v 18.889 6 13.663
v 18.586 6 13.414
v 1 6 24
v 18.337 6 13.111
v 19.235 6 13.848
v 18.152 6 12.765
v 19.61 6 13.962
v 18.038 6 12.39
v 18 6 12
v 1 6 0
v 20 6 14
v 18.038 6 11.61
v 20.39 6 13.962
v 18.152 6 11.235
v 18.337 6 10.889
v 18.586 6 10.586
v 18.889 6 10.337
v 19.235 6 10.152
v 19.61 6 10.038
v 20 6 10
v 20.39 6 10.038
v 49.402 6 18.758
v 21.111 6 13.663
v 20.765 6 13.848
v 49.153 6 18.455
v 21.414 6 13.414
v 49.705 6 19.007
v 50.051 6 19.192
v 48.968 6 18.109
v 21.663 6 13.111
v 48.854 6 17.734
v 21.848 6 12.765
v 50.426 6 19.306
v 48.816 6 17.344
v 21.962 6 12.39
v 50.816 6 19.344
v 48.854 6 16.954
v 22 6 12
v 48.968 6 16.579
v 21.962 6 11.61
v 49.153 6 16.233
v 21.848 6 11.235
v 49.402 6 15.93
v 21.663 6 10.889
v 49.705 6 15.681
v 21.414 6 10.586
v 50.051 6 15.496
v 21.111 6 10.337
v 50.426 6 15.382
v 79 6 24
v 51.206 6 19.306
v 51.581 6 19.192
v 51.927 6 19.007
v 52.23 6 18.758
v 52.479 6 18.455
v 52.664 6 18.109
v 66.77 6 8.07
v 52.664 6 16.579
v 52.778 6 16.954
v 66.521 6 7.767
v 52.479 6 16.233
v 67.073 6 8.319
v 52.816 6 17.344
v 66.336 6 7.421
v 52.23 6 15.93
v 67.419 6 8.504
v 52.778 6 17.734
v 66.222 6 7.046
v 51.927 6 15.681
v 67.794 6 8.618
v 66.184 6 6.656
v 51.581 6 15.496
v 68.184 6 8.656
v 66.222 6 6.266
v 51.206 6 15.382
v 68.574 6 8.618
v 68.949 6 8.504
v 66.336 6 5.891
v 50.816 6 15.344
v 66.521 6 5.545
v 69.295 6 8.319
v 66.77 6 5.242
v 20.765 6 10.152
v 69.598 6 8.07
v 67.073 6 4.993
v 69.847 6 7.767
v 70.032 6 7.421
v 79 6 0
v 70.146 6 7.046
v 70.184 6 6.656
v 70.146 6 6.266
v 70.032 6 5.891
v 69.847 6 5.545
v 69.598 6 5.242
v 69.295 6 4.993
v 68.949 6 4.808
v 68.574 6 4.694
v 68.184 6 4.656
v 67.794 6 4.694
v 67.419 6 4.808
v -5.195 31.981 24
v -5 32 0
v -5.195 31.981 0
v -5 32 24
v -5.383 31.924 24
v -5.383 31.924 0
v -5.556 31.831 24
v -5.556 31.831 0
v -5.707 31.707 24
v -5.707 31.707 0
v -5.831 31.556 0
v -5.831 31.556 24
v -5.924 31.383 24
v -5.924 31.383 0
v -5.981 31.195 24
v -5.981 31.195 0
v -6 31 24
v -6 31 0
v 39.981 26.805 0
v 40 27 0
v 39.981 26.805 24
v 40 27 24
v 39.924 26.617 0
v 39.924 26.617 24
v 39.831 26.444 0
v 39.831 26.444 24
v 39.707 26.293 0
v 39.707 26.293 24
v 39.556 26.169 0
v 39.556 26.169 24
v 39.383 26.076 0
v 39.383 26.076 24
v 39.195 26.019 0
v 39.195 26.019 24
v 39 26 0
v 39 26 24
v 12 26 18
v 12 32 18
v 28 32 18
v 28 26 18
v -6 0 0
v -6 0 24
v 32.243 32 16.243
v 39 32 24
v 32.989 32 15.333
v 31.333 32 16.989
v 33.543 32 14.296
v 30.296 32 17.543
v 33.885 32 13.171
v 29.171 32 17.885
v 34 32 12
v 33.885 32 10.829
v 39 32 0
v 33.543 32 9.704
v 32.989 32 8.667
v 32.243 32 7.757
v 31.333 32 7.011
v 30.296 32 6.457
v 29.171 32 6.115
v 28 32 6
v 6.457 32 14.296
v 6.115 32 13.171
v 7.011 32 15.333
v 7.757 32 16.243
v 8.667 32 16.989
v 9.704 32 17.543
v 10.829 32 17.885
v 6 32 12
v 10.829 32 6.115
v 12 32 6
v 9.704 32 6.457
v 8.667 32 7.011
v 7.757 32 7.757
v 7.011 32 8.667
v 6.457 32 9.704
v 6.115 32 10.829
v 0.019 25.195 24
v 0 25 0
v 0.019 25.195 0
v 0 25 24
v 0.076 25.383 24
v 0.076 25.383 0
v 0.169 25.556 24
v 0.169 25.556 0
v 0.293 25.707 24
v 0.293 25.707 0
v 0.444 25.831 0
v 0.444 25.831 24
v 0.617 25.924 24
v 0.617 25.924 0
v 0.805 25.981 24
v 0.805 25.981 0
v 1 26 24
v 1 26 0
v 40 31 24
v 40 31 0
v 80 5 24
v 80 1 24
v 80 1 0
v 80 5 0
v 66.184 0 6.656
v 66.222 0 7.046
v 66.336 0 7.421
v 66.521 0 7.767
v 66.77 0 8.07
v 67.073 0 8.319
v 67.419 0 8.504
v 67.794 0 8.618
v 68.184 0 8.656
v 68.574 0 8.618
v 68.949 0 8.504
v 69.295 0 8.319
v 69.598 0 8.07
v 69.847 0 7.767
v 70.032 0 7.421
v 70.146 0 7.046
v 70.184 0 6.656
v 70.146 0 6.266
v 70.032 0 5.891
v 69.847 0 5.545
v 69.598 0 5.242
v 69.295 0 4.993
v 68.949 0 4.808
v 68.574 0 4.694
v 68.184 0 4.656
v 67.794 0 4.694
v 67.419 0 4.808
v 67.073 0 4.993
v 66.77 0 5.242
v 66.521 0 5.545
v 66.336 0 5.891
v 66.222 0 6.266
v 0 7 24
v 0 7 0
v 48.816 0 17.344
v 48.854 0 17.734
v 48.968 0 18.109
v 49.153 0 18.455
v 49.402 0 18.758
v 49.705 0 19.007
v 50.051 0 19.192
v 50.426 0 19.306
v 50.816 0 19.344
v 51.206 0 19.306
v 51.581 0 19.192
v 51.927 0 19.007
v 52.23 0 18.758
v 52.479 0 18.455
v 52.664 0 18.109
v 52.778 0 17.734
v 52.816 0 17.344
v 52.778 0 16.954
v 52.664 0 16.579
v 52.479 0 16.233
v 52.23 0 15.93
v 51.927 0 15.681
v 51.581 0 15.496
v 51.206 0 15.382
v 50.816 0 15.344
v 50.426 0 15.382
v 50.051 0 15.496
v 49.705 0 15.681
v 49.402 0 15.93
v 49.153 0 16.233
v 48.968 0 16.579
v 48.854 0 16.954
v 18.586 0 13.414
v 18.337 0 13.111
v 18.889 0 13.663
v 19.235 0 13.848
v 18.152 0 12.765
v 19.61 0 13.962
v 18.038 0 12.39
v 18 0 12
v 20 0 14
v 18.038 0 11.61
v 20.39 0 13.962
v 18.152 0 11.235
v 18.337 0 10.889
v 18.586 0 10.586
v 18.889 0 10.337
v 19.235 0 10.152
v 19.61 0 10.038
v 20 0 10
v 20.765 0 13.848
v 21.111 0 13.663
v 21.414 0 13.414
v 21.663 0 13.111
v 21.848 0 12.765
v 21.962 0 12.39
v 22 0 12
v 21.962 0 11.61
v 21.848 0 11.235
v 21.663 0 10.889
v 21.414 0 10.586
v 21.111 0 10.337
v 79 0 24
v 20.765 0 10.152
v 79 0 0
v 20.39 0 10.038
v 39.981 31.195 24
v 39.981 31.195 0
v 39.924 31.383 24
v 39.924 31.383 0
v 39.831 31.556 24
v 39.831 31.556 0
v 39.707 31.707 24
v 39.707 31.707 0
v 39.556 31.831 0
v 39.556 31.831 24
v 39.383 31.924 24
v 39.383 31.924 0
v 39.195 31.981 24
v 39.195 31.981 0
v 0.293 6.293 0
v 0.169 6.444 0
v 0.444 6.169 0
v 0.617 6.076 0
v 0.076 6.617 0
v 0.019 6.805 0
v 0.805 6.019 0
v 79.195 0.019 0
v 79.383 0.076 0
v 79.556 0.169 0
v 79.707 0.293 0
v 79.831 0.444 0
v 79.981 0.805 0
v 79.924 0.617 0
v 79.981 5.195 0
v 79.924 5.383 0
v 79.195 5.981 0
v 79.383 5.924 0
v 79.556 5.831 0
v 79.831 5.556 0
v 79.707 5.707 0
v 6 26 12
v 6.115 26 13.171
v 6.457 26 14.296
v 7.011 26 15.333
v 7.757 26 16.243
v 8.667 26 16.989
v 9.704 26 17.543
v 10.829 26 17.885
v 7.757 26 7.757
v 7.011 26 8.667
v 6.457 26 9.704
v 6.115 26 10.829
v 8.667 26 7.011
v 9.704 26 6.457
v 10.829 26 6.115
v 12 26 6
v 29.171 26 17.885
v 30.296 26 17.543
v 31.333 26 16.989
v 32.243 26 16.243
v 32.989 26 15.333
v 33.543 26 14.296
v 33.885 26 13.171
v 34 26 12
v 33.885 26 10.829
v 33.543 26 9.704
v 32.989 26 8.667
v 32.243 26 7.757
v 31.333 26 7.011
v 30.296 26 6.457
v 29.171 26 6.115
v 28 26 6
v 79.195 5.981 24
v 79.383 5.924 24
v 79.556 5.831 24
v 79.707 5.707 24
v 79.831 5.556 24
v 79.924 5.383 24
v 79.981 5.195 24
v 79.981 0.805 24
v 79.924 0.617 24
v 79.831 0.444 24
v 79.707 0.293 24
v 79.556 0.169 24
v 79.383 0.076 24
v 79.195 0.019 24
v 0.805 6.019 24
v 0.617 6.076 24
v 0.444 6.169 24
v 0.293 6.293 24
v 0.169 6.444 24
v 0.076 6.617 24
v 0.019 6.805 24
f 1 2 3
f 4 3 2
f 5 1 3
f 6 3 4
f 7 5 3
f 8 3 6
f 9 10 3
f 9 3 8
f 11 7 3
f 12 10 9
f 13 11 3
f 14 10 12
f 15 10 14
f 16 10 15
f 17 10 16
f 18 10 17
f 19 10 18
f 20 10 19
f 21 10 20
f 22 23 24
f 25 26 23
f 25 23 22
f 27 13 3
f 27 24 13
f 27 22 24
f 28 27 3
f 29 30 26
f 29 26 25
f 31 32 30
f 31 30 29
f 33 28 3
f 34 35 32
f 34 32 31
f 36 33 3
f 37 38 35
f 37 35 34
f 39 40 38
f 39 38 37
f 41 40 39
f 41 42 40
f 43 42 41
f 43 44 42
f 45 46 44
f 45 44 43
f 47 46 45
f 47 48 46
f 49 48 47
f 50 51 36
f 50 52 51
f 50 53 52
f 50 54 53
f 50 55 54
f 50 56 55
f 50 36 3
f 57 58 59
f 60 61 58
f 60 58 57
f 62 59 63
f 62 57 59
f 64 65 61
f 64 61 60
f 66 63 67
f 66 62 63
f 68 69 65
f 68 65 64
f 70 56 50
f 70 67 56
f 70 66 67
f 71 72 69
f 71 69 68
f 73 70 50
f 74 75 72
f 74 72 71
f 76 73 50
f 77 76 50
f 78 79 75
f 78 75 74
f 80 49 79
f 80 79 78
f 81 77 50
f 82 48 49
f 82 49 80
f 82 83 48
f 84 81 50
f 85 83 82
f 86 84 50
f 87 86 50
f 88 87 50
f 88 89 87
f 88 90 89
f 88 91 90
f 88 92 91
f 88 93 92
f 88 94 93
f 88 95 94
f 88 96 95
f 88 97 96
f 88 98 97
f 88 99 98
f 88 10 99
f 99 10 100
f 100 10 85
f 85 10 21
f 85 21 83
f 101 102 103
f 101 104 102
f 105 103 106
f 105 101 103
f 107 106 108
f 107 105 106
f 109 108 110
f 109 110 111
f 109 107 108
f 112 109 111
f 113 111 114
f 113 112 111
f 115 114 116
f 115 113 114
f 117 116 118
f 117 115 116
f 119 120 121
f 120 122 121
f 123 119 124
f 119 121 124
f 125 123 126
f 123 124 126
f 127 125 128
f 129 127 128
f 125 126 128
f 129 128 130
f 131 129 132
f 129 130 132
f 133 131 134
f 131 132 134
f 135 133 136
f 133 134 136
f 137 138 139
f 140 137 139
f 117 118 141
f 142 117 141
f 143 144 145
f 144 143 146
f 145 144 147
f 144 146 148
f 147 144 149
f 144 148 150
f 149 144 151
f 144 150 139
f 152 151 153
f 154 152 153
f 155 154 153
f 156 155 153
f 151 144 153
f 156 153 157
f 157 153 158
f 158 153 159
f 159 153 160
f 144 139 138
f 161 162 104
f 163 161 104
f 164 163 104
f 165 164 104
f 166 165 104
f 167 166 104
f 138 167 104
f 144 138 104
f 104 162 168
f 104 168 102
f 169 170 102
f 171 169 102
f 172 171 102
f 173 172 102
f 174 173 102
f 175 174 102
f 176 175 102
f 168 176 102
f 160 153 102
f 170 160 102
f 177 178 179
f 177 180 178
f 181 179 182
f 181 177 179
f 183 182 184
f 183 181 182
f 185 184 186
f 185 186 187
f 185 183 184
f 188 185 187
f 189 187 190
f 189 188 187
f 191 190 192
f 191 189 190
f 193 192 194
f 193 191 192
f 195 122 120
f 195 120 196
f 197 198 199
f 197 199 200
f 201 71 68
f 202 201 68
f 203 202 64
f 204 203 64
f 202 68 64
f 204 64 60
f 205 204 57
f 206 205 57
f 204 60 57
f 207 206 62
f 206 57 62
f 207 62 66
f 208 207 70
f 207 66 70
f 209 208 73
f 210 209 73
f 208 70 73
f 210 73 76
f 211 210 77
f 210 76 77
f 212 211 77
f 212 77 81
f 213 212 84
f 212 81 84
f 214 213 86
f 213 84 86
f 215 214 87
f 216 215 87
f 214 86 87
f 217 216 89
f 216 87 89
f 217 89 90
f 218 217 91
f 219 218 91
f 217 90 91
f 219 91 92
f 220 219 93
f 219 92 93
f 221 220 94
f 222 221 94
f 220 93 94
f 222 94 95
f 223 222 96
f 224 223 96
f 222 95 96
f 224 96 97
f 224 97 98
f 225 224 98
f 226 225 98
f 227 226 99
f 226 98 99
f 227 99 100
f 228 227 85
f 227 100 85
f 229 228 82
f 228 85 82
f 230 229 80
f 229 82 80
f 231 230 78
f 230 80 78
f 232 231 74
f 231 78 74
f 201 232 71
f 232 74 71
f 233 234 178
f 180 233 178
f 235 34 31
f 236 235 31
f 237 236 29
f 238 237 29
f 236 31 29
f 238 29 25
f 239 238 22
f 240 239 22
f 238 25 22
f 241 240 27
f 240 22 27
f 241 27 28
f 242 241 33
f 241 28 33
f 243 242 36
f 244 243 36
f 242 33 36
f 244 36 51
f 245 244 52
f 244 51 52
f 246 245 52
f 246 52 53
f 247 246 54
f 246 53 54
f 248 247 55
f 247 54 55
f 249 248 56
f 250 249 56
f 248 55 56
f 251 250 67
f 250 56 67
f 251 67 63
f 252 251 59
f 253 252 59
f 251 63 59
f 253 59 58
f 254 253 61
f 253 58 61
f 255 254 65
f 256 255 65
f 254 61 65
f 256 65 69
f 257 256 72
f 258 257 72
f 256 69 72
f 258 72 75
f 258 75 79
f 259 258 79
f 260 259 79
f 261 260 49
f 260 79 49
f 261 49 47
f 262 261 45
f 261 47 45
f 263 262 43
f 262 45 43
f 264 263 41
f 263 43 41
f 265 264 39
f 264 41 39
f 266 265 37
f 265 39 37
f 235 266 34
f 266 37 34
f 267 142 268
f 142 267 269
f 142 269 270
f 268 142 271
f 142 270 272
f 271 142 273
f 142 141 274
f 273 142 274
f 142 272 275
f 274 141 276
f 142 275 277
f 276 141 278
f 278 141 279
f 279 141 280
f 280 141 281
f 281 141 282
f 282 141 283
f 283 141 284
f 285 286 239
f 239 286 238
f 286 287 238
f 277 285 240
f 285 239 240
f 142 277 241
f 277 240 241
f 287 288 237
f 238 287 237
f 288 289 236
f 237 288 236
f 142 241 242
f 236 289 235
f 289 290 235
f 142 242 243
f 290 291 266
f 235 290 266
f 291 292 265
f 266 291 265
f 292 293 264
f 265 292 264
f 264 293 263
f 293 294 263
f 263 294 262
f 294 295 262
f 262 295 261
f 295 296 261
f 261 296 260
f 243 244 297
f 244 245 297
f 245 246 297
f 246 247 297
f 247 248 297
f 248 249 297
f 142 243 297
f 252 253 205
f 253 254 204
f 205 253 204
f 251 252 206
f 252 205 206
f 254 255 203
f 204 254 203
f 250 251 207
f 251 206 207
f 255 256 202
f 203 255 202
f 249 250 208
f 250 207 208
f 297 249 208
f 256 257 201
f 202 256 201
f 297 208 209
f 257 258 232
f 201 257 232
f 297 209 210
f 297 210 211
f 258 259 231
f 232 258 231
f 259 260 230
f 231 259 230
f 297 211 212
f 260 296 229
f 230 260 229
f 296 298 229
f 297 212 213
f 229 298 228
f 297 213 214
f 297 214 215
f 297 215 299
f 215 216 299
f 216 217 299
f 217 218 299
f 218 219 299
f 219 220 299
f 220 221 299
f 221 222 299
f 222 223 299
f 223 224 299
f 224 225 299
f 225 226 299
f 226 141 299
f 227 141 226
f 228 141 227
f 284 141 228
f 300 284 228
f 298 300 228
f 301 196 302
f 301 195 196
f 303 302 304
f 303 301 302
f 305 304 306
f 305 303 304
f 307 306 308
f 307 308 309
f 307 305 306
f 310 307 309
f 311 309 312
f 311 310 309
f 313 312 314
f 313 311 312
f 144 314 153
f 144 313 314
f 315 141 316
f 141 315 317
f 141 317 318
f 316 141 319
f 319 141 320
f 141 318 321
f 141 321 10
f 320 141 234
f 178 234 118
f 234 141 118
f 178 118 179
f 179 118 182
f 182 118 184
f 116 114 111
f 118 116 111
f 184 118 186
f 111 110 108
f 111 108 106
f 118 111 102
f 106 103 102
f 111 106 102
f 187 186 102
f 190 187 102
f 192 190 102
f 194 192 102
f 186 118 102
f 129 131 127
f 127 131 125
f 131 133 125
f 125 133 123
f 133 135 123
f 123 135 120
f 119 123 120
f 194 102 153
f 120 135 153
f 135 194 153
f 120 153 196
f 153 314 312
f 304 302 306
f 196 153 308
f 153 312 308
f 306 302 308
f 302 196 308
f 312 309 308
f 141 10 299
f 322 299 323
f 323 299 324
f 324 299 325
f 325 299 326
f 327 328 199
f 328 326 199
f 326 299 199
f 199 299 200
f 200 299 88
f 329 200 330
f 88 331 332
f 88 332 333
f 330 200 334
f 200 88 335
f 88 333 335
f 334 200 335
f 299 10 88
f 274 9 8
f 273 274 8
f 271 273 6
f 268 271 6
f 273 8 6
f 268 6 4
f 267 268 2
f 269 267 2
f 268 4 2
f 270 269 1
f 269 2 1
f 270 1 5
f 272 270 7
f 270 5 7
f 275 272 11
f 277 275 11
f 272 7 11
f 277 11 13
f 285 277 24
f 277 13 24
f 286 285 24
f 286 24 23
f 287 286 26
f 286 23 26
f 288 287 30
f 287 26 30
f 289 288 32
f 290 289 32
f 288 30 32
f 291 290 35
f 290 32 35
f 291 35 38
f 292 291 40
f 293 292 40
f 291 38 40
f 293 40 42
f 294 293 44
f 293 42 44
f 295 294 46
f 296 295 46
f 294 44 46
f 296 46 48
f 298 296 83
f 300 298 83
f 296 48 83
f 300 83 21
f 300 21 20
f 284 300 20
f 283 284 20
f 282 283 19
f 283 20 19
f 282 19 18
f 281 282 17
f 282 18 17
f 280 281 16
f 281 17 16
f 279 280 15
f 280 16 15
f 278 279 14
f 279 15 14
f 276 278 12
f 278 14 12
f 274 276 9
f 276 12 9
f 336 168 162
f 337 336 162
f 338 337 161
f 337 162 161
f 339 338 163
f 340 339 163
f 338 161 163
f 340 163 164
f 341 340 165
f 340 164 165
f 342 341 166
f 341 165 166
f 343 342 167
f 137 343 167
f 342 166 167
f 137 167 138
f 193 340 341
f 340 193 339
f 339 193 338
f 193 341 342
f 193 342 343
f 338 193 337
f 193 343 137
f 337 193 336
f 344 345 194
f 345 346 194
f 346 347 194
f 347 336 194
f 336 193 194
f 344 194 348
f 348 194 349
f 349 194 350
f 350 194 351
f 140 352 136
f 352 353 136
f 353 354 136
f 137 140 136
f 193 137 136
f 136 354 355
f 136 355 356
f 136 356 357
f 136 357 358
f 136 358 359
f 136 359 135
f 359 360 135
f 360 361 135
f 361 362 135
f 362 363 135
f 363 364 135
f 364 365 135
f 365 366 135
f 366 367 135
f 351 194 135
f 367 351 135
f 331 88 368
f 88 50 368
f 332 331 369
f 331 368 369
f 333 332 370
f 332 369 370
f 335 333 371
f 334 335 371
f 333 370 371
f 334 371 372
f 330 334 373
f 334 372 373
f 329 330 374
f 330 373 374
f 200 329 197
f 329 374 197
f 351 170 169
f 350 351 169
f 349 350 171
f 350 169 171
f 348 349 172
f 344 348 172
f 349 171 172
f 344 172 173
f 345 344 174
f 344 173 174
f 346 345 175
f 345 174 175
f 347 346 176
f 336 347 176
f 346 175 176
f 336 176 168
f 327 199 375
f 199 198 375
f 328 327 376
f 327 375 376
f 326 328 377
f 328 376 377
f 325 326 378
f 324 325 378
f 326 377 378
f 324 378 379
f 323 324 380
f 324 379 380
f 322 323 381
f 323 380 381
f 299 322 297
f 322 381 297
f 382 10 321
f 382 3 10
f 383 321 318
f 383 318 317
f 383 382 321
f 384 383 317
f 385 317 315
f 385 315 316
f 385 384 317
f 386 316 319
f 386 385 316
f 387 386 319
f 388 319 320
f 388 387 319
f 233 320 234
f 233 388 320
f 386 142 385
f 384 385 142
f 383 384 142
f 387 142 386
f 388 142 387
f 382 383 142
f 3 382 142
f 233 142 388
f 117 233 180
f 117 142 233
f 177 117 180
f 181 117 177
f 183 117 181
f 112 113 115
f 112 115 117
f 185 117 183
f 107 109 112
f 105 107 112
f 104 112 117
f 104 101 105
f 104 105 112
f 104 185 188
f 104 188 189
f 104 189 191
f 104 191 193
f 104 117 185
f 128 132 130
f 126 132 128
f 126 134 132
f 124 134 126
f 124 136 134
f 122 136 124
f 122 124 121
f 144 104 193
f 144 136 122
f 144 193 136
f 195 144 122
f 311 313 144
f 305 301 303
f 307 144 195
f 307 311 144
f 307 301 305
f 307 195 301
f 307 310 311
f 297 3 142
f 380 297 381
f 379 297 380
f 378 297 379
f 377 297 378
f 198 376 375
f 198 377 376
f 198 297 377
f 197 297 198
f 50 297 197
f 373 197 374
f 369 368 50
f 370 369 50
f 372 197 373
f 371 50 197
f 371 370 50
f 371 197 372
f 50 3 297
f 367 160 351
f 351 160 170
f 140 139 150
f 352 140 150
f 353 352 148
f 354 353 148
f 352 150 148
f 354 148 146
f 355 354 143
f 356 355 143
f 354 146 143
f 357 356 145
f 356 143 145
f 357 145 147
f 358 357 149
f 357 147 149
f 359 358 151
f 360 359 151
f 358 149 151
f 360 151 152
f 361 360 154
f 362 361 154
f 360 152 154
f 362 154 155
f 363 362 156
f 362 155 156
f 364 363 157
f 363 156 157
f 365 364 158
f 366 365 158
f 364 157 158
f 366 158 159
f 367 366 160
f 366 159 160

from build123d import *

# Parameters (mm, degrees)
F0_W      = 40
F0_H      = 6
F0_W_2    = 80
F1_DEPTH  = 24
F2_R      = 1
F3_R      = 1
F4_R      = 1
F5_R      = 1
F6_R      = 1
F7_R      = 1
F8_R      = 1
F10_DEPTH = 6
F11_R     = 2
F12_DEPTH = 6


with BuildPart() as f1:
    # F0 (on Top) → F1 (new body)
    with BuildSketch(Plane.XY):
        with Locations((20, 29)):
            Rectangle(F0_W, F0_H)
        with Locations((40, 3)):
            Rectangle(F0_W_2, F0_H)
        Polygon((-6, 0), (0, 0), (0, 6), (0, 26), (0, 32), (-6, 32), align=None)
    extrude(amount=F1_DEPTH)

    # F2
    f2_edges = [f1.edges().sort_by_distance(p)[0] for p in [
        (0, 6, 12),
    ]]
    fillet(f2_edges, radius=F2_R)

    # F3
    f3_edges = [f1.edges().sort_by_distance(p)[0] for p in [
        (80, 6, 12),
    ]]
    fillet(f3_edges, radius=F3_R)

    # F4
    f4_edges = [f1.edges().sort_by_distance(p)[0] for p in [
        (80, 0, 12),
    ]]
    fillet(f4_edges, radius=F4_R)

    # F5
    f5_edges = [f1.edges().sort_by_distance(p)[0] for p in [
        (0, 26, 12),
    ]]
    fillet(f5_edges, radius=F5_R)

    # F6
    f6_edges = [f1.edges().sort_by_distance(p)[0] for p in [
        (40, 32, 12),
    ]]
    fillet(f6_edges, radius=F6_R)

    # F7
    f7_edges = [f1.edges().sort_by_distance(p)[0] for p in [
        (40, 26, 12),
    ]]
    fillet(f7_edges, radius=F7_R)

    # F8
    f8_edges = [f1.edges().sort_by_distance(p)[0] for p in [
        (-6, 32, 12),
    ]]
    fillet(f8_edges, radius=F8_R)

    # F9 (on face) → F10 (cut)
    with BuildSketch(Plane(origin=(0, 32, 0), x_dir=(-1, 0, 0), z_dir=(0, 1, 0))):
        with BuildLine():
            ThreePointArc((-28, 6), (-23.7573593129, 7.7573593129), (-22, 12))
            ThreePointArc((-22, 12), (-23.7573593129, 16.2426406871), (-28, 18))
            Line((-28, 18), (-28, 6))
        make_face()
        with BuildLine():
            ThreePointArc((-28, 18), (-23.7573593129, 16.2426406871), (-22, 12))
            ThreePointArc((-22, 12), (-23.7573593129, 7.7573593129), (-28, 6))
            Line((-28, 6), (-12, 6))
            ThreePointArc((-12, 6), (-18, 12), (-12, 18))
            Line((-12, 18), (-28, 18))
        make_face()
        with BuildLine():
            Line((-28, 6), (-28, 18))
            ThreePointArc((-28, 18), (-34, 12), (-28, 6))
        make_face()
        with BuildLine():
            Line((-12, 6), (-12, 18))
            ThreePointArc((-12, 18), (-18, 12), (-12, 6))
        make_face()
        with BuildLine():
            ThreePointArc((-6, 12), (-7.7573593129, 16.2426406871), (-12, 18))
            Line((-12, 18), (-12, 6))
            ThreePointArc((-12, 6), (-7.7573593129, 7.7573593129), (-6, 12))
        make_face()
    extrude(amount=-F10_DEPTH, mode=Mode.SUBTRACT)

    # F11 (on face) → F12 (cut)
    with BuildSketch(Plane(origin=(0, 6, 0), x_dir=(-1, 0, 0), z_dir=(0, 1, 0))):
        with Locations((-20, 12)):
            Circle(F11_R)
        with Locations((-68.1839393779, 6.6560373059)):
            Circle(F11_R)
        with Locations((-50.8160606221, 17.3439626941)):
            Circle(F11_R)
    extrude(amount=-F12_DEPTH, mode=Mode.SUBTRACT)


solid = f1.part
